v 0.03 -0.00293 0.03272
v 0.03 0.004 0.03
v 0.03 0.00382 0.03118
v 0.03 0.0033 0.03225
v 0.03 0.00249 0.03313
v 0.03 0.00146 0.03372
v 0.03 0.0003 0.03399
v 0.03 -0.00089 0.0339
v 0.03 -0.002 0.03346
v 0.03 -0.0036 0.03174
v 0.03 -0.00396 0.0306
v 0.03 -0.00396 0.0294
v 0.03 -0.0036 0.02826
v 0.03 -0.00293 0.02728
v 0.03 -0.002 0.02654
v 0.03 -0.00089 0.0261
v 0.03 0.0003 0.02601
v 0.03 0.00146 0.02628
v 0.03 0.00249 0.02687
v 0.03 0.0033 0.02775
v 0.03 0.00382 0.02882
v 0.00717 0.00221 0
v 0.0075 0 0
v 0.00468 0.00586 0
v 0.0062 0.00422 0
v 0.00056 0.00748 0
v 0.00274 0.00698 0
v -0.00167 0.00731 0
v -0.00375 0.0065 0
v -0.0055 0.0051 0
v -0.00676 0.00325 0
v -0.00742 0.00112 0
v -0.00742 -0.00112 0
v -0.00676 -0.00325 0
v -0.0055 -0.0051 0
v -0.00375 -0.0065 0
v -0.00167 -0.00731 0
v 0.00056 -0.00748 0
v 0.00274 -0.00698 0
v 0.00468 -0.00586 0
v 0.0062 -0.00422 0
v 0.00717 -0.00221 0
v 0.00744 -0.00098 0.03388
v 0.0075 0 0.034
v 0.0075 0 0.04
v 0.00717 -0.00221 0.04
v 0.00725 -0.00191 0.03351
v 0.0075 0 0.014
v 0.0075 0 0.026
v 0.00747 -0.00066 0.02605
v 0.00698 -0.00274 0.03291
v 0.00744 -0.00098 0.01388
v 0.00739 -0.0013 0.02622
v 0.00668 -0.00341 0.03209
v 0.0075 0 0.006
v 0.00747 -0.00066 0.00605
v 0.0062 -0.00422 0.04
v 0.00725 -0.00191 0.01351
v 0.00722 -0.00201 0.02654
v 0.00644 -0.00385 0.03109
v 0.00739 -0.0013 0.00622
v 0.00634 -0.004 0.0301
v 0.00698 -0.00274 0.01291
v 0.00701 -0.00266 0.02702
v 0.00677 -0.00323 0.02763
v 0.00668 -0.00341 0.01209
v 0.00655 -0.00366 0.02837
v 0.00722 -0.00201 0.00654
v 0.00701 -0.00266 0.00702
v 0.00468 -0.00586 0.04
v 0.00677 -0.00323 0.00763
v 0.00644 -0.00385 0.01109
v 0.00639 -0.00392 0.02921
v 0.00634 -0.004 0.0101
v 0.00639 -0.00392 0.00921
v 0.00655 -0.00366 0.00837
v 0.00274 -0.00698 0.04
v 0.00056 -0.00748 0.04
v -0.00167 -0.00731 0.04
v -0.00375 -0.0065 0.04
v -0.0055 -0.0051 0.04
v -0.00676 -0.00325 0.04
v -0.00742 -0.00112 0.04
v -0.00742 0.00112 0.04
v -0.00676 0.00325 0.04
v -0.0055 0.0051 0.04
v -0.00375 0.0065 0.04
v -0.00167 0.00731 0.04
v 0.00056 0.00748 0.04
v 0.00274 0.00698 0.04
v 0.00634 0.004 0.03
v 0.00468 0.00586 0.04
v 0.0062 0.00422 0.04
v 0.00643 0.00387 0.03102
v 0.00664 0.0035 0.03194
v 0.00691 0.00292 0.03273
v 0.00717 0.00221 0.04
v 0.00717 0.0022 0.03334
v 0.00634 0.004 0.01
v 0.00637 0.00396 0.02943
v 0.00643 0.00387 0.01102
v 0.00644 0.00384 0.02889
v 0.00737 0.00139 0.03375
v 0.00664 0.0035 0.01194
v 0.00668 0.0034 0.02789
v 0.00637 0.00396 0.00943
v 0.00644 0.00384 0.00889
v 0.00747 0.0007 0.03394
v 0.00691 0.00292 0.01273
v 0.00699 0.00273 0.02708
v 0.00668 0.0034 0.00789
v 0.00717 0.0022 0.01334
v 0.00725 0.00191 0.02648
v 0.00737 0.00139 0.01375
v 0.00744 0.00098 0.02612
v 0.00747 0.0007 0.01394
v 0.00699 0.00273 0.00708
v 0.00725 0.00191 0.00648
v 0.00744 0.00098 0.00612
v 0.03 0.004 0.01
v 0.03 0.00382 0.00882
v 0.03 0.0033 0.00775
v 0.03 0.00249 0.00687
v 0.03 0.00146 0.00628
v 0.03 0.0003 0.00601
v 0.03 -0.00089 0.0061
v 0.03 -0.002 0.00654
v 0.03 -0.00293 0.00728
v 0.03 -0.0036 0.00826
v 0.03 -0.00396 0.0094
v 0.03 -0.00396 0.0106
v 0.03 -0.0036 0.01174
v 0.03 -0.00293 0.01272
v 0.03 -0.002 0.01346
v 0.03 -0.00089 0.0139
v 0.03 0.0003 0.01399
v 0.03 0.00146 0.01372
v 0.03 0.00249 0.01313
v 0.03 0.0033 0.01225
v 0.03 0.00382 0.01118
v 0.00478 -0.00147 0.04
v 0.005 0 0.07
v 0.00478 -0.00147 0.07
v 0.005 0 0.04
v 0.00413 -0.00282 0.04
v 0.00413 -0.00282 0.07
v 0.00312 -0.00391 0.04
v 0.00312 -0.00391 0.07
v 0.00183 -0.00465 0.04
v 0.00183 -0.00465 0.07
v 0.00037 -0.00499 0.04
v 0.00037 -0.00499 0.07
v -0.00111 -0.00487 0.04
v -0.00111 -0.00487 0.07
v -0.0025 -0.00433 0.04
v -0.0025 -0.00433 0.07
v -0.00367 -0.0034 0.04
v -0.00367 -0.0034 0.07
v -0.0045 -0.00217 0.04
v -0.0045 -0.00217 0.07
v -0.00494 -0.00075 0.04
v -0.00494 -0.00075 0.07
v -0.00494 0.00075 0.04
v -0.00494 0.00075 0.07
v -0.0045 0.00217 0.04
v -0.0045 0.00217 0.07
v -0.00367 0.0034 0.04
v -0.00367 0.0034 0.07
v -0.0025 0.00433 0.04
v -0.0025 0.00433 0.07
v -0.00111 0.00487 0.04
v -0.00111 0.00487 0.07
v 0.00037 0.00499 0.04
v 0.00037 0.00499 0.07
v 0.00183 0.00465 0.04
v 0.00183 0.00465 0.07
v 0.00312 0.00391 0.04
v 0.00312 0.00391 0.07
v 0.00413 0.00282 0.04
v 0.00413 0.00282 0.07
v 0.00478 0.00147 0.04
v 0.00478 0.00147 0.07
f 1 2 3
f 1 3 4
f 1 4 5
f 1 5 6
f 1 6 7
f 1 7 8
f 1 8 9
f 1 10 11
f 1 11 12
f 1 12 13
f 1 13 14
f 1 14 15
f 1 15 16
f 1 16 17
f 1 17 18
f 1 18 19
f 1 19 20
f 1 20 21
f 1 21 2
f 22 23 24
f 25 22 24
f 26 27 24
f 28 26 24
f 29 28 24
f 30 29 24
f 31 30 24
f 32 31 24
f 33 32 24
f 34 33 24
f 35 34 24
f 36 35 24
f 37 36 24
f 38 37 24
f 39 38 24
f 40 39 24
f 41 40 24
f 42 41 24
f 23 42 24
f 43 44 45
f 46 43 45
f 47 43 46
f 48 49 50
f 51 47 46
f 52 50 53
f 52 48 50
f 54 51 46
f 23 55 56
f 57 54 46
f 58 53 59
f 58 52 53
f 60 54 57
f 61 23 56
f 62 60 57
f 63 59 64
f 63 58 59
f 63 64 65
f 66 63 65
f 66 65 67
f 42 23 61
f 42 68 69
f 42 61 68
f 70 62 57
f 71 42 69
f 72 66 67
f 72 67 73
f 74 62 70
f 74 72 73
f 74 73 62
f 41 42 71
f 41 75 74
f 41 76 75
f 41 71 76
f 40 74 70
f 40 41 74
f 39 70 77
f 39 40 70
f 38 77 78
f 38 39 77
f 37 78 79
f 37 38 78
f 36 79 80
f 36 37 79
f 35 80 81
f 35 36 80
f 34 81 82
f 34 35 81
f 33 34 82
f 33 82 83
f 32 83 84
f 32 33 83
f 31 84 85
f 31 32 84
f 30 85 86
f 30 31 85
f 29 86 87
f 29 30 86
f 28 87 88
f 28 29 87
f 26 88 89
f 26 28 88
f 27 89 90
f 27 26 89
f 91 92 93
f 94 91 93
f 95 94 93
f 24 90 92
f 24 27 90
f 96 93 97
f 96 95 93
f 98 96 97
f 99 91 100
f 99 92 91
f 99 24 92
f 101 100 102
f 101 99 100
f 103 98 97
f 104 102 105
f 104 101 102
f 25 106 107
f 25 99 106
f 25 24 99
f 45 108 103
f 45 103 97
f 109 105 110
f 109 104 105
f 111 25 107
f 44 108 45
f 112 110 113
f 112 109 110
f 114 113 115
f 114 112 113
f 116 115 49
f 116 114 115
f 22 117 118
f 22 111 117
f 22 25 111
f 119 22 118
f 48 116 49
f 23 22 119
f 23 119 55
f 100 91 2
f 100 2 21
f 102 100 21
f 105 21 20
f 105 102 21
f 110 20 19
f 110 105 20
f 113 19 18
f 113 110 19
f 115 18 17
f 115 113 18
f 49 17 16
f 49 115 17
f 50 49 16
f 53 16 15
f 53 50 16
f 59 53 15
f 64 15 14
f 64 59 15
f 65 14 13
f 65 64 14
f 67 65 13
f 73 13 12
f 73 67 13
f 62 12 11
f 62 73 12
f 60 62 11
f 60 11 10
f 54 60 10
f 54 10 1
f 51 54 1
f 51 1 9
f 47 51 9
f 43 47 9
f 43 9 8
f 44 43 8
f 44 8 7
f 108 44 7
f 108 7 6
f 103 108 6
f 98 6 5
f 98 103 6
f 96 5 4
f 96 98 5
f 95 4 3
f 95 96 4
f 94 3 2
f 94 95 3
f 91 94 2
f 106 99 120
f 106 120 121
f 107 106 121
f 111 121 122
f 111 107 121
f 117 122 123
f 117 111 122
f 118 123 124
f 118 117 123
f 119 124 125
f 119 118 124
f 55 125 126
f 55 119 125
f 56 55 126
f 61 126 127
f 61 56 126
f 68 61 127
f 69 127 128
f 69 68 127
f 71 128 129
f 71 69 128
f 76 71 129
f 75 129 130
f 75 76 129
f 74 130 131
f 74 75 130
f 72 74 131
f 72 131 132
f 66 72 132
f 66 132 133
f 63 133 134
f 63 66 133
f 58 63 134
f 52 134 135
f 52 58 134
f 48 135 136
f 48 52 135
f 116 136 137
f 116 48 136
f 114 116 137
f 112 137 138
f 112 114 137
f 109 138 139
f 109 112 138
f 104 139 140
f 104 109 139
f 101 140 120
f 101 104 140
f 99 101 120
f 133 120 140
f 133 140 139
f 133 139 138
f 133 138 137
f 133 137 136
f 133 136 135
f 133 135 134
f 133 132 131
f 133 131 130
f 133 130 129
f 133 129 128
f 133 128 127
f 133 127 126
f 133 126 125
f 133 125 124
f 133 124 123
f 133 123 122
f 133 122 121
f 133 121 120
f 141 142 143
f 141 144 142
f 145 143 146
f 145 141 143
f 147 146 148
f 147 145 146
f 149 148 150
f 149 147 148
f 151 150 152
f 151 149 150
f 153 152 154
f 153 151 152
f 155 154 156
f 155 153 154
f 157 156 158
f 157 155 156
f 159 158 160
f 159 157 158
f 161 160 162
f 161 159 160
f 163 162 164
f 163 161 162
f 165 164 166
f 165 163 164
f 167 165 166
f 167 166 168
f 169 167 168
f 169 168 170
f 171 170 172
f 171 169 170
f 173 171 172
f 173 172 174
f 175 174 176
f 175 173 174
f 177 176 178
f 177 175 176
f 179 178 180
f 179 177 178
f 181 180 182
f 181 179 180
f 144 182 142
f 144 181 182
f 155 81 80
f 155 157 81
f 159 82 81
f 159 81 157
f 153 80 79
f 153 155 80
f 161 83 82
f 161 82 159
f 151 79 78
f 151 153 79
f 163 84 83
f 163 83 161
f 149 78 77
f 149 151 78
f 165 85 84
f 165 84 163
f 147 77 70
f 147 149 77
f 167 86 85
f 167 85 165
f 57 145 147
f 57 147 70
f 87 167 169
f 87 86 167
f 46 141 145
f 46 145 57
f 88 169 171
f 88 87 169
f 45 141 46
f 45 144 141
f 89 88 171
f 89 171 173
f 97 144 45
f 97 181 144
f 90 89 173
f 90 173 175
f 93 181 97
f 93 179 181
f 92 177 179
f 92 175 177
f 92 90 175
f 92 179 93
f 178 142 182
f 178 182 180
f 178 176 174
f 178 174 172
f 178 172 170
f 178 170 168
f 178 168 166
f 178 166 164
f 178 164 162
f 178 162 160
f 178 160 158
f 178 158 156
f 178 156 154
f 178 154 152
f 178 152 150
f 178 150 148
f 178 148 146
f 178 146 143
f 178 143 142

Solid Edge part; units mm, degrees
sketch "Sketch1" plane through (0, 0, 0) normal (0, 0, 1) x (1, 0, 0)
  circle A0 centre (0, 0) radius 0.0075
  dimension "D1" = 0.015
extrude "Protrusion1" add sketch "Sketch1" along normal blind 0.04
sketch "Sketch2" plane through (0, 0, 0.04) normal (0, 0, 1) x (1, 0, 0)
  circle A0 centre (0, 0) radius 0.005
  dimension "D1" = 0.01
extrude "Ausprägung_2" add sketch "Sketch2" along normal blind 0.03
sketch "Sketch3" plane through (0, 0, 0) normal (1, 0, 0) x (0, 1, 0)
  circle A0 centre (0, 0.01) radius 0.004
  circle A1 centre (0, 0.03) radius 0.004
  dimension "D1" = 0.01
  dimension "D2" = 0.02
  dimension "D3" = 0.008
extrude "Ausprägung_3" add sketch "Sketch3" along normal blind 0.03
